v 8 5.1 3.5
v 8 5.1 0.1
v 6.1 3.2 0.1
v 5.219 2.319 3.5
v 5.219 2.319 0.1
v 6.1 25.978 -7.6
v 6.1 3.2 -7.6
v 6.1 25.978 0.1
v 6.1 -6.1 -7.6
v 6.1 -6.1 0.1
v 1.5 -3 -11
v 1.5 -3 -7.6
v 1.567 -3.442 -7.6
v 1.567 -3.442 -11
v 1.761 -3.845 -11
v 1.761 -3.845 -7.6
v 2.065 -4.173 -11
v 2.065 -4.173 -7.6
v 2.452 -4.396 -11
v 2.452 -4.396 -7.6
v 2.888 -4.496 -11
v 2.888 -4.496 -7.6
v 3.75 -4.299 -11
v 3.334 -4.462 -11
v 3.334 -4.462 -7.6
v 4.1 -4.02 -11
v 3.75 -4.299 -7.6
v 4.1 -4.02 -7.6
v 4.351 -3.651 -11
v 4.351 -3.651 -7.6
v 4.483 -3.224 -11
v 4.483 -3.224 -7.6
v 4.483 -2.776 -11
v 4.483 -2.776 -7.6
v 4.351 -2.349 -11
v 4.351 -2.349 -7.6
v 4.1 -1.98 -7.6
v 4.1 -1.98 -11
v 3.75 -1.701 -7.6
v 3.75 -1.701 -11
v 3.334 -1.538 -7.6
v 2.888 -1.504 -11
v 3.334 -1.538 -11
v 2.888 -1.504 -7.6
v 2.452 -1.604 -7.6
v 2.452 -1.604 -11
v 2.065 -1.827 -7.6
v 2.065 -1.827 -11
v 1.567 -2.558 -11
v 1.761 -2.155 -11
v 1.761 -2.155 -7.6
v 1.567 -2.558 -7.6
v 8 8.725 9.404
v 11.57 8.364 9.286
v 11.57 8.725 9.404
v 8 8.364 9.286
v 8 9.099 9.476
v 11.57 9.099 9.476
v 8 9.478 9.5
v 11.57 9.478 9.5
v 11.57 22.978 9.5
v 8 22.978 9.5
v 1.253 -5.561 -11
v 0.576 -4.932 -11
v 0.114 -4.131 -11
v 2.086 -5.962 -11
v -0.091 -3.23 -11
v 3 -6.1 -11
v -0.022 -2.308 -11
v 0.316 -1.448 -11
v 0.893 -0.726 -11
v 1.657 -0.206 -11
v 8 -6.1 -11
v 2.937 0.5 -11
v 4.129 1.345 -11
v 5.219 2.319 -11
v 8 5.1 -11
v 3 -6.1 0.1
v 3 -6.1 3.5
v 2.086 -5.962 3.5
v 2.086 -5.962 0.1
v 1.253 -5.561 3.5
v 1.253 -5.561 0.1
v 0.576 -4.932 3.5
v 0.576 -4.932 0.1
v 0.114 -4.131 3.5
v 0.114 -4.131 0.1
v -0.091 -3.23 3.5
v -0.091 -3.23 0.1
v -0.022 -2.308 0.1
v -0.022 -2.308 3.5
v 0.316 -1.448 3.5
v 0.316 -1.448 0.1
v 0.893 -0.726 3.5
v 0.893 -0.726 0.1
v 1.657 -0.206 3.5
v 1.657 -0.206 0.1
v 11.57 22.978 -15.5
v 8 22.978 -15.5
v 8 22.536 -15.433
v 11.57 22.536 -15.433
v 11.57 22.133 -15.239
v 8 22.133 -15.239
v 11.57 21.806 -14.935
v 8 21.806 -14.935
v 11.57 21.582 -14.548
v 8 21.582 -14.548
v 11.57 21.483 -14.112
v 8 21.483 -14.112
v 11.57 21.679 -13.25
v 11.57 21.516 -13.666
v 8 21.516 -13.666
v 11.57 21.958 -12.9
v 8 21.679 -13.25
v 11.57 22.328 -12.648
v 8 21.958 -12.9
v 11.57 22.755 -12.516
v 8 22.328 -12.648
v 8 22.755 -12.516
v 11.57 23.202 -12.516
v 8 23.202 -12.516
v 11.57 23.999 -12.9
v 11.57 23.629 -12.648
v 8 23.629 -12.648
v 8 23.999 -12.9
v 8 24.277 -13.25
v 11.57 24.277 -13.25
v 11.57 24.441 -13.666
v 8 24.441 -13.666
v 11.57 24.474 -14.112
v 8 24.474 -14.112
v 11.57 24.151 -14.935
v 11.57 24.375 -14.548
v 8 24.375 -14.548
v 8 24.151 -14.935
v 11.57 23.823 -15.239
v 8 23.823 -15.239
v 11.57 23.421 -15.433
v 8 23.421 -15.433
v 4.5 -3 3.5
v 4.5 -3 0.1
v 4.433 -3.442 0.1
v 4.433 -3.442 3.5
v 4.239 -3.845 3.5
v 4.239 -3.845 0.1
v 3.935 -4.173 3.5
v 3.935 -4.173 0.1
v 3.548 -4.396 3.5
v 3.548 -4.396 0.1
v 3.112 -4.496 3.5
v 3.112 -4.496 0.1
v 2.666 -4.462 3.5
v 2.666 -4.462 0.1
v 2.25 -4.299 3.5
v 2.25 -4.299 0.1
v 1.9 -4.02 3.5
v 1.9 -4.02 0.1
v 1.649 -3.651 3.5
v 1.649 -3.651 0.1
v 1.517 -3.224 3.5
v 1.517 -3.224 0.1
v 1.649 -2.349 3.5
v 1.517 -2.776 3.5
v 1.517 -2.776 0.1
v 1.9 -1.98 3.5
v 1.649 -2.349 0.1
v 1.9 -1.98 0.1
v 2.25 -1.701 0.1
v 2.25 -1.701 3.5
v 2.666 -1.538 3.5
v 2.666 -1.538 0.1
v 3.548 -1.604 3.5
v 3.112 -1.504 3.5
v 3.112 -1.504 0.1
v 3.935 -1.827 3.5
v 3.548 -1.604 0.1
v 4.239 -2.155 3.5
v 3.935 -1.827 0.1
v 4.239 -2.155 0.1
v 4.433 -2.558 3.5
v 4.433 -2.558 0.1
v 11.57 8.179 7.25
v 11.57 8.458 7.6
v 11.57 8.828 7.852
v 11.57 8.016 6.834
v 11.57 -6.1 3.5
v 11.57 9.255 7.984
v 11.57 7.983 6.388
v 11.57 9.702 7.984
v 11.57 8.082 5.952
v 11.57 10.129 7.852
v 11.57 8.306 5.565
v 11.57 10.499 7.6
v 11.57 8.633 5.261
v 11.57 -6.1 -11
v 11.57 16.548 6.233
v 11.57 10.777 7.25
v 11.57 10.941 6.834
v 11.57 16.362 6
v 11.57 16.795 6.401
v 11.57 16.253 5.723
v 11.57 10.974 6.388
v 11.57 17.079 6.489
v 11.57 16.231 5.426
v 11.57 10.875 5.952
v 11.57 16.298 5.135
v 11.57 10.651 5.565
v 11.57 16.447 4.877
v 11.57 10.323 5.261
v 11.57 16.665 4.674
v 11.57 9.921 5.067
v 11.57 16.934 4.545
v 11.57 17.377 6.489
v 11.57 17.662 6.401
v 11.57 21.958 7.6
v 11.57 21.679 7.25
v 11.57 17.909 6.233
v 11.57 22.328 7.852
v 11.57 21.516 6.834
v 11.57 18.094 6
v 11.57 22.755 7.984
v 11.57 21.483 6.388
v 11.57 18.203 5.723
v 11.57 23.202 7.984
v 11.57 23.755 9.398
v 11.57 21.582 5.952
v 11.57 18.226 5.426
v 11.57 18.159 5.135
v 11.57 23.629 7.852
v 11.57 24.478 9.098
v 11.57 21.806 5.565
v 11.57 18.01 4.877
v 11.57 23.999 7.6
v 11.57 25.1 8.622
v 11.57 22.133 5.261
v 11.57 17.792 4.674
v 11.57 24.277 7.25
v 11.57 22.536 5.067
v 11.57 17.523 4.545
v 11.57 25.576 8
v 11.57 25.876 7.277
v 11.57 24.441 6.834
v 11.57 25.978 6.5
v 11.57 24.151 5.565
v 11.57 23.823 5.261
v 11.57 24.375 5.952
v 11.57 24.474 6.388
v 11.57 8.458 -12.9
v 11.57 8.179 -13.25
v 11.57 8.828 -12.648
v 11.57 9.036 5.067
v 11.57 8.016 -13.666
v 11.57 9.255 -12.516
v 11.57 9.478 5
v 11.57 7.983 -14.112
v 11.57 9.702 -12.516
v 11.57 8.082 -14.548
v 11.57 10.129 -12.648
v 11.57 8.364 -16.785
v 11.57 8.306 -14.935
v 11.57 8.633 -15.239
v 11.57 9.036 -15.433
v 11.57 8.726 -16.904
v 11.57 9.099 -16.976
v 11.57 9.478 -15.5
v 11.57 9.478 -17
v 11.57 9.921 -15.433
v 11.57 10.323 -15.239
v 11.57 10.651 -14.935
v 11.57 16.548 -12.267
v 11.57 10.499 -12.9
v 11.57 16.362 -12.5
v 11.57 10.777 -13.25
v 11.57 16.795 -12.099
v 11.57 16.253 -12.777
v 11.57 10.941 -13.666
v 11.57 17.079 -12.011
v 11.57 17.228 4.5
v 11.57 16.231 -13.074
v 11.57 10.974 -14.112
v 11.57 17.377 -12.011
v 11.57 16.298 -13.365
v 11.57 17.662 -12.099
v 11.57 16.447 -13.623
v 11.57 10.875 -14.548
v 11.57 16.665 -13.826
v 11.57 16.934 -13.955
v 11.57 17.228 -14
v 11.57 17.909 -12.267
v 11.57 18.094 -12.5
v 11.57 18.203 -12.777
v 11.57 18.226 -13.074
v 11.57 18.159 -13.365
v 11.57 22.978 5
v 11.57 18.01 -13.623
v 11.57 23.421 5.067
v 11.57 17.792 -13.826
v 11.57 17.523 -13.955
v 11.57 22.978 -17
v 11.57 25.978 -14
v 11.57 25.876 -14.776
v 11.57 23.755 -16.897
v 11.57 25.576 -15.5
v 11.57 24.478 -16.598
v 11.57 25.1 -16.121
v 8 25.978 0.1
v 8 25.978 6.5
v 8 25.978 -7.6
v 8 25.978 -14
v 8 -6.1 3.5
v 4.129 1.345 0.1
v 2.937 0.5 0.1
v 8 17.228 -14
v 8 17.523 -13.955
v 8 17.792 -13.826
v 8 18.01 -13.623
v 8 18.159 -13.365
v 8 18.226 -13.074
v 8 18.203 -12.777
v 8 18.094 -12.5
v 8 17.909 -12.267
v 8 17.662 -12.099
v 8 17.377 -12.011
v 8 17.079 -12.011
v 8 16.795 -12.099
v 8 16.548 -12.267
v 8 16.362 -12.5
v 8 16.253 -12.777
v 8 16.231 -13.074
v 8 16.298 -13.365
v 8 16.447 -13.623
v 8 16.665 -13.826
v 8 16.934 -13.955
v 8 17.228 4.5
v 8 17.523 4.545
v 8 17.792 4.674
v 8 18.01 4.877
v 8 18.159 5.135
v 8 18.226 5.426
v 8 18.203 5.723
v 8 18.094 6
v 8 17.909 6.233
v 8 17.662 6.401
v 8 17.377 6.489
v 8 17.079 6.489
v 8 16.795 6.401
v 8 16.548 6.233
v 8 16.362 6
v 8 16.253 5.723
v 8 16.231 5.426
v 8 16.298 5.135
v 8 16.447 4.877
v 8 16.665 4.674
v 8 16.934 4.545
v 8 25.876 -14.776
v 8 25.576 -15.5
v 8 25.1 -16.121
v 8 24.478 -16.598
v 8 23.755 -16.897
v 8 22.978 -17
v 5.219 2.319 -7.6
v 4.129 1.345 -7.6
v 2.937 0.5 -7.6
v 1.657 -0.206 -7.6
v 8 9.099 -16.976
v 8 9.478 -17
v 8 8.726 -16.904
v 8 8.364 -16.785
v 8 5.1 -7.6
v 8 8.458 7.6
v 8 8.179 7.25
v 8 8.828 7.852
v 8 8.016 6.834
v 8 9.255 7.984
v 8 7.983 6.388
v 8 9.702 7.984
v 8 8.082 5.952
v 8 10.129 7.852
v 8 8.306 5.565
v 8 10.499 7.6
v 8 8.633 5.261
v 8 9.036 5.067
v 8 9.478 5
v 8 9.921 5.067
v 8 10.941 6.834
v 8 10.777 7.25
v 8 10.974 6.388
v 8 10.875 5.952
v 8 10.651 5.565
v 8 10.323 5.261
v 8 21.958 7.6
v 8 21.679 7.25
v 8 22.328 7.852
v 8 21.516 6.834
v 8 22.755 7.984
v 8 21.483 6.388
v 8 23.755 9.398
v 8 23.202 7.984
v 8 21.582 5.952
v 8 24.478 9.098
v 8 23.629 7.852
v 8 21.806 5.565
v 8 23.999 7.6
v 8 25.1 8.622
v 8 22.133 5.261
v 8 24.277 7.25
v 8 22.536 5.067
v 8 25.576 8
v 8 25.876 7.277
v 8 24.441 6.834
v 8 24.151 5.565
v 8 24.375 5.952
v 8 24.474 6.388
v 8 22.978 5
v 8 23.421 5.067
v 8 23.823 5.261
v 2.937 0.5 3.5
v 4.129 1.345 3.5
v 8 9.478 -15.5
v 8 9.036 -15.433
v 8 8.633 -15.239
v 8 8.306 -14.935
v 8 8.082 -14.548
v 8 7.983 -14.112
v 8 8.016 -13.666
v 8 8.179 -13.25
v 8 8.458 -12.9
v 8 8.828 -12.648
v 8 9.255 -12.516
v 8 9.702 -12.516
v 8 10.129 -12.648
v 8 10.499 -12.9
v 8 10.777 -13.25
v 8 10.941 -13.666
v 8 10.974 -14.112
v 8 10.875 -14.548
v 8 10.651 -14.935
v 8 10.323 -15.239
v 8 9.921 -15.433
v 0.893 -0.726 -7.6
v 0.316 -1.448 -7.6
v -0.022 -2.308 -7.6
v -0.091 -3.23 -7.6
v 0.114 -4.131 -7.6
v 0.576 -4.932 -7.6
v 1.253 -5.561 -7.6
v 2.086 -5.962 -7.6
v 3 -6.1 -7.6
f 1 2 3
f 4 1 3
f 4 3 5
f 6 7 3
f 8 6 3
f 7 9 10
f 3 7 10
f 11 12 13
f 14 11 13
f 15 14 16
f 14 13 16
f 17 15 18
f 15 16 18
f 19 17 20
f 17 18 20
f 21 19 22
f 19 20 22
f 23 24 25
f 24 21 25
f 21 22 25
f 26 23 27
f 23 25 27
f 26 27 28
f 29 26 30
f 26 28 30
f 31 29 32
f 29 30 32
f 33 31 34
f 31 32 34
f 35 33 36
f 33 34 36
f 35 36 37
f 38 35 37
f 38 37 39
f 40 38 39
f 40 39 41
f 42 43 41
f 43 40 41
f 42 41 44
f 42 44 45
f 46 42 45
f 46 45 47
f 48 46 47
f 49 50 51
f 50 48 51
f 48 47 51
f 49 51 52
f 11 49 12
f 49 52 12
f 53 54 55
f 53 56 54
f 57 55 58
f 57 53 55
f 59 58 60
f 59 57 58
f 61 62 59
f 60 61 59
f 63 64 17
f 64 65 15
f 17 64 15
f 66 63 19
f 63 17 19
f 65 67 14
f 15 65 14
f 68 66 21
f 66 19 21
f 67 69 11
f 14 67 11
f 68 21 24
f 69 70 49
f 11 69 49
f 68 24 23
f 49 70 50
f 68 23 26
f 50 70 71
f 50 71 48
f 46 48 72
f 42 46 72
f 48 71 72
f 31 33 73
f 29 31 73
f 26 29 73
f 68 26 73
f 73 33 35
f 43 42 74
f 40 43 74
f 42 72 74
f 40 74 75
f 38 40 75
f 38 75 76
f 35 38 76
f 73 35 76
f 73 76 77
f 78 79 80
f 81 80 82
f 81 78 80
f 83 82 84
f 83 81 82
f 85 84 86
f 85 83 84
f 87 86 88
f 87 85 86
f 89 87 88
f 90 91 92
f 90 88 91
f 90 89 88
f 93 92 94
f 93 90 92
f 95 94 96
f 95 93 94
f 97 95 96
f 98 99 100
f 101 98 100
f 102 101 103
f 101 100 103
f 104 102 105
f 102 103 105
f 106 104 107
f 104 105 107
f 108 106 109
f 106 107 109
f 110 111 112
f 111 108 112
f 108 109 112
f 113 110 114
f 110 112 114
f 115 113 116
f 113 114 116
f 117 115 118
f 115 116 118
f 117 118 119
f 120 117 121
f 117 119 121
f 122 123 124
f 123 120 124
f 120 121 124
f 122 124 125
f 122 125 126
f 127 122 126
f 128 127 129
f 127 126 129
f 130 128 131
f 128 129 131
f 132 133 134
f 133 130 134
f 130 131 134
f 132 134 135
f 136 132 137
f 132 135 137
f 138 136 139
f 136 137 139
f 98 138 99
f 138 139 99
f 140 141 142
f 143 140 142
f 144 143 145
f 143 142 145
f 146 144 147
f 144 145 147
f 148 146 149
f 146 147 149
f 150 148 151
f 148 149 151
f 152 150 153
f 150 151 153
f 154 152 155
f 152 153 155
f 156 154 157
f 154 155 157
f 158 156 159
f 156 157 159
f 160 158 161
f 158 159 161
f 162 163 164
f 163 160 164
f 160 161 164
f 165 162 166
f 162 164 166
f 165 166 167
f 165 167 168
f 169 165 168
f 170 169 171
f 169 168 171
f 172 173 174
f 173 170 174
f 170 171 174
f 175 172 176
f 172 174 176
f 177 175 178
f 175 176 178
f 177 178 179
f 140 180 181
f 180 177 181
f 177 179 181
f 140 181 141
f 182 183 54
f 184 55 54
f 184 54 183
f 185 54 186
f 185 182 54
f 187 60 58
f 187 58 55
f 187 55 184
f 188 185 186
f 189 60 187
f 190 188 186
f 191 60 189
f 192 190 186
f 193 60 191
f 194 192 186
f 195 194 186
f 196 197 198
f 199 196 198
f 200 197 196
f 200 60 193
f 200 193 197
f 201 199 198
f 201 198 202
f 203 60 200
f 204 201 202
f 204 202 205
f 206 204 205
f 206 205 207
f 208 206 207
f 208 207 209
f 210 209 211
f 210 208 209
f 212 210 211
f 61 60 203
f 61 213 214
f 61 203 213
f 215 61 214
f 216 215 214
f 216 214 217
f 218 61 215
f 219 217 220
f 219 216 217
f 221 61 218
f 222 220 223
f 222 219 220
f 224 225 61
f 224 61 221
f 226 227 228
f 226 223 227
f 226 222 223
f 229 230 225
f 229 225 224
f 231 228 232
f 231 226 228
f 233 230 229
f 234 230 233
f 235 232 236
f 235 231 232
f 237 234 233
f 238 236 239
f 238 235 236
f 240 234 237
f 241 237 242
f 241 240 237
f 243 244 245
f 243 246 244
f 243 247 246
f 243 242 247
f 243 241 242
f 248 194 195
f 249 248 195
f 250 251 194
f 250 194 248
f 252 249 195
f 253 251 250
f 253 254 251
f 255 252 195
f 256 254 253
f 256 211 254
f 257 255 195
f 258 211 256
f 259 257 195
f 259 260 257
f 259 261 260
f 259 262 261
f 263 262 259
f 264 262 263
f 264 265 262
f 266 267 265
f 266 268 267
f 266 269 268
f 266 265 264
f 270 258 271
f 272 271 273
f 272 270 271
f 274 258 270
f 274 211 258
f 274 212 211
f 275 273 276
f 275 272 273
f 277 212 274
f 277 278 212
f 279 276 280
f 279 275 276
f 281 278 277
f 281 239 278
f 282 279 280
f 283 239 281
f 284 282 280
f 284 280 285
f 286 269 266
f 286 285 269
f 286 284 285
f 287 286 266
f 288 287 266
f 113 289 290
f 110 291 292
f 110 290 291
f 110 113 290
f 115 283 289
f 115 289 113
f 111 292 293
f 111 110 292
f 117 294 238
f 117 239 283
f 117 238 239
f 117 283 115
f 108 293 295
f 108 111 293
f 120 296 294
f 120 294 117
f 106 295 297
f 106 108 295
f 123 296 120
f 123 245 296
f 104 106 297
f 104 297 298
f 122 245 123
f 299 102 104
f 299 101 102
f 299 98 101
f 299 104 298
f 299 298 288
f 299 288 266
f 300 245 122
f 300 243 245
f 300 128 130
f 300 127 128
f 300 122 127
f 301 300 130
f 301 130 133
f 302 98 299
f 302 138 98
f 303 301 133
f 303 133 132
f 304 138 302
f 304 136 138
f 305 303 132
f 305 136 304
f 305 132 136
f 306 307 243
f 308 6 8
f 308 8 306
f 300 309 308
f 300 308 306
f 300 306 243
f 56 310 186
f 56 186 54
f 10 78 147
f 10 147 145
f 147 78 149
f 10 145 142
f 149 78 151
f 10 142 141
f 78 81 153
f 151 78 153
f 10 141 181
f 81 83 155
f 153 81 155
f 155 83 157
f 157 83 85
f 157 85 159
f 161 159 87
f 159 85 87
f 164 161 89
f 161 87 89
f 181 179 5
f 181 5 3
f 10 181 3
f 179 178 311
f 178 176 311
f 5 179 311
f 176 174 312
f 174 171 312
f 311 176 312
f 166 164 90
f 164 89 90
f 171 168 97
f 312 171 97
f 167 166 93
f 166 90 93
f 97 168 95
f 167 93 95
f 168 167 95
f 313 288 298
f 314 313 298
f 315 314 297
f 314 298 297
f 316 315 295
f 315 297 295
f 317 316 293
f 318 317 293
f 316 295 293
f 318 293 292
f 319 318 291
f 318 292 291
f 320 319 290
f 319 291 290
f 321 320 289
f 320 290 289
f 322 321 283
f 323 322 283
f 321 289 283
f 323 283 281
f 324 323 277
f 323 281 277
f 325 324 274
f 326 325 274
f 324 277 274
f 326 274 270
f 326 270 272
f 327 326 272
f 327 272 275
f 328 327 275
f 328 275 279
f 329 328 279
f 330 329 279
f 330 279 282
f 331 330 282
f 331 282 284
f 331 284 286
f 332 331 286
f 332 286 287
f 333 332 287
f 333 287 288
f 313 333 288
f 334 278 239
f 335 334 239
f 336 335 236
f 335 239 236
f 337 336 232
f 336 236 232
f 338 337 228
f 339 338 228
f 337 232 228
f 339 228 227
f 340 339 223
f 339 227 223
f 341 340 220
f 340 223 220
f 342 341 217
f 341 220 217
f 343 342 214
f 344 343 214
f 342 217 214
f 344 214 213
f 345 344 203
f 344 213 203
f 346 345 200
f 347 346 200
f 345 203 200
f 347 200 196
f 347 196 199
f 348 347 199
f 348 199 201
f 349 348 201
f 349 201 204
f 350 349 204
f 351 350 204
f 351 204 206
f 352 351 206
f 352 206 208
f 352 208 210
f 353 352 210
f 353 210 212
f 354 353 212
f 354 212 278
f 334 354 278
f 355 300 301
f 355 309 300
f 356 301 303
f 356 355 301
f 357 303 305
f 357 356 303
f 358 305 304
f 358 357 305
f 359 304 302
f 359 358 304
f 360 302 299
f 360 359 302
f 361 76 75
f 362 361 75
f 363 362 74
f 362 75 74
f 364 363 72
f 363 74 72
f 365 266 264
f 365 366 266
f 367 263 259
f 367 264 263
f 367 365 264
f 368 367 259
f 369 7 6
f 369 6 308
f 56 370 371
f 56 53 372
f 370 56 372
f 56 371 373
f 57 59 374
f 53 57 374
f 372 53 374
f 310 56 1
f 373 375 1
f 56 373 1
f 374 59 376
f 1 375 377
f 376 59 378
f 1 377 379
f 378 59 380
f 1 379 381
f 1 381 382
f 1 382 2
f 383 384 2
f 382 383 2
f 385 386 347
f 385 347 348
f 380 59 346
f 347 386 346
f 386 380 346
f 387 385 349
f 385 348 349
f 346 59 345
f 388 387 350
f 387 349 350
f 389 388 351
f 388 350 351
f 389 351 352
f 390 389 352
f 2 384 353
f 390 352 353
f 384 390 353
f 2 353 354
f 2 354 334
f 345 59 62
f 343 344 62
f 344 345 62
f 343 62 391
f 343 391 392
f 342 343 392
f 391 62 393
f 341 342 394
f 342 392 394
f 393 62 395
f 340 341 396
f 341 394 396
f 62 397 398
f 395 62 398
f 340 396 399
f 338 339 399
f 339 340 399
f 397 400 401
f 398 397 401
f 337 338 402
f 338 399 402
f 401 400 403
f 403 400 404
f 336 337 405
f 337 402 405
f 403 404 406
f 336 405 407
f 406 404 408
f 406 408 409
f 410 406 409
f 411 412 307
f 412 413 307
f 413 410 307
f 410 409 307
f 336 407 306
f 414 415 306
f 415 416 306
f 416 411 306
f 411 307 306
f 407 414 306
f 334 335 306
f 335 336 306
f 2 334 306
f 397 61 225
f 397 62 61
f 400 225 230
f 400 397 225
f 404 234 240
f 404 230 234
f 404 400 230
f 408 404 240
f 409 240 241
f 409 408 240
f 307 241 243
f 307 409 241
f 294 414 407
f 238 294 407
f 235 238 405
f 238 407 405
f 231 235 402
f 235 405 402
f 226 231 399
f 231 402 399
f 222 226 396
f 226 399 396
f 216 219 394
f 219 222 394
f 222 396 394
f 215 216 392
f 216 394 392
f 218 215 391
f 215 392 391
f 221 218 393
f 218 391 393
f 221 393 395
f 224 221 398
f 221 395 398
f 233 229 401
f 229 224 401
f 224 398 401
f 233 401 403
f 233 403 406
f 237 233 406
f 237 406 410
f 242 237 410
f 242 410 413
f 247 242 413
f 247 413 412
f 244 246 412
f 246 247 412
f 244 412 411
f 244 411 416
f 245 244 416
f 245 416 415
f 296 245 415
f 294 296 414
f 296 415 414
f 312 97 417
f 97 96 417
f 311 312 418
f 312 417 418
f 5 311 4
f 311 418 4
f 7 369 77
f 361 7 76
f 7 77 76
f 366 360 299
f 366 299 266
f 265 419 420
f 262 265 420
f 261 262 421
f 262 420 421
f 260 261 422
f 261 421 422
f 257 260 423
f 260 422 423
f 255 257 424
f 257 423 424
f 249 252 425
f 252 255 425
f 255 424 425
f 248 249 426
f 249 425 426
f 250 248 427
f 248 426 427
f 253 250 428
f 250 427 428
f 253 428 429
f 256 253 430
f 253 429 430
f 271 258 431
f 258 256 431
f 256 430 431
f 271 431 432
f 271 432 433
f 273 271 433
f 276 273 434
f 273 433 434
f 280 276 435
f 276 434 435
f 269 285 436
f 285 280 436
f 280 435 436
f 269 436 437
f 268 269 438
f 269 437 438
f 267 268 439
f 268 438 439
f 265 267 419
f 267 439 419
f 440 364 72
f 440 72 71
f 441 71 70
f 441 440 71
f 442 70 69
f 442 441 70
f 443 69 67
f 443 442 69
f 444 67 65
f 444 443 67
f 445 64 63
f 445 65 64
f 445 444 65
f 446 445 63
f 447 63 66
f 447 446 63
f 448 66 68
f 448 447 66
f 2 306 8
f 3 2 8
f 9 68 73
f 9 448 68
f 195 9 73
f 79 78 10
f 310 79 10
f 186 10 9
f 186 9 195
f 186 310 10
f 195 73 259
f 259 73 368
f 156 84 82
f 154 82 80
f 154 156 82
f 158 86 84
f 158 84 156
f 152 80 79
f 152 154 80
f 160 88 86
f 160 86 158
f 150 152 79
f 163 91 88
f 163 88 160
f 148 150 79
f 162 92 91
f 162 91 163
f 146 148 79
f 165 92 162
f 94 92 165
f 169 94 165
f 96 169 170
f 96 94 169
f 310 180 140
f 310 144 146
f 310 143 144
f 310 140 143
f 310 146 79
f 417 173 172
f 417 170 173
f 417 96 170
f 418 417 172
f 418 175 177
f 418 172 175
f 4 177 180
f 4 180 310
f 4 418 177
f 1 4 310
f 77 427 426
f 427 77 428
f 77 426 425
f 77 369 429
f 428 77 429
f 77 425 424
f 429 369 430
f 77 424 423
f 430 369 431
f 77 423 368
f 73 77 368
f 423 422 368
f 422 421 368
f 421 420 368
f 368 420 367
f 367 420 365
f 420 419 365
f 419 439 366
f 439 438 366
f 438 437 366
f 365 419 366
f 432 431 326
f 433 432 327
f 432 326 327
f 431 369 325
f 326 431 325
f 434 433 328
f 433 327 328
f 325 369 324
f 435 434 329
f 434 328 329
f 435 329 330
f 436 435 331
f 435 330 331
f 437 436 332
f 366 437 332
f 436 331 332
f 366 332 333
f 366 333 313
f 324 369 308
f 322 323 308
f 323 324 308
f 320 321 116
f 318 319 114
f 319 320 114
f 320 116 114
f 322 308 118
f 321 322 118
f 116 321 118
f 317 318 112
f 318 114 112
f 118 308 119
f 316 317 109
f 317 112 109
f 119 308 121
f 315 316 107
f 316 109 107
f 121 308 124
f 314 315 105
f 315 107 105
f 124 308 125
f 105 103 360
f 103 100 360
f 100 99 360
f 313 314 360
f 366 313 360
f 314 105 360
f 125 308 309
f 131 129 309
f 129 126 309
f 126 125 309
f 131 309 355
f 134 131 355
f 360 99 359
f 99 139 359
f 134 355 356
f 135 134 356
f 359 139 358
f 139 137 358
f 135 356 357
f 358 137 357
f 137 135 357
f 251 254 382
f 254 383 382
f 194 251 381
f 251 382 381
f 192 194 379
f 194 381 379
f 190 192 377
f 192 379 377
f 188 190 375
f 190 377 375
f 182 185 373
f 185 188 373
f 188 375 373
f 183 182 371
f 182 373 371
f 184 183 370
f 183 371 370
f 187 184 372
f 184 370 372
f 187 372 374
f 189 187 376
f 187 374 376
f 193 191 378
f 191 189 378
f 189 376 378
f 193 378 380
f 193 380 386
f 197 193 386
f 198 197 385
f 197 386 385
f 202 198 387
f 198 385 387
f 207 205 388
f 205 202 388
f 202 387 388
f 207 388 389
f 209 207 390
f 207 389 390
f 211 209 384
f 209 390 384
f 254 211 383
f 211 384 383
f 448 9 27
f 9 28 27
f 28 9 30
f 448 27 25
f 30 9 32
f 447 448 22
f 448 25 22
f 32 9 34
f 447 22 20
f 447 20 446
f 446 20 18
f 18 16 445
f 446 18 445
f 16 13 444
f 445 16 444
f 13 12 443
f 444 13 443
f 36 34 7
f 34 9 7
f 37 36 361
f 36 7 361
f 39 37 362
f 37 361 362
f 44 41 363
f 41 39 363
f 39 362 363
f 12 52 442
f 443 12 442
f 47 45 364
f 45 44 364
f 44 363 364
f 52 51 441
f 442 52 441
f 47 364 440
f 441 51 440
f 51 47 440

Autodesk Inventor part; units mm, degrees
ref_plane "YZ Plane" through (0, 0, 0) normal (1, 0, 0) x (0, 1, 0)
sketch "Sketch1" plane through (0, 0, 0) normal (0, 0, 1) x (1, 0, 0)
  circle A0 centre (3, -3) radius 1.5 projected
  arc A1 (4.6242, -5.5223) -> (3, 0) centre (3, -3) ccw projected
  arc A2 (4.6783, -5.6064) -> (3, 0.1) centre (3, -3) ccw
  circle A3 centre (3, -3) radius 3.1
  point P0 (0, 0)
  point P1 (3, 0.1)
  dimension "d0" = 0.1
extrude "Extrusion1" add sketch "Sketch1" along normal blind 3.5
sketch "Sketch2" plane through (3, -3, 0) normal (0, 0, -1) x (-1, 0, 0)
  circle A0 centre (0, 0) radius 3.1 projected
  point P0 (3, 3)
extrude "Extrusion2" cut sketch "Sketch2" against normal blind 0.1
sketch "Sketch3" plane through (3, -3, 3.5) normal (0, 0, 1) x (1, 0, 0)
  circle A0 centre (0, 0) radius 3.1 projected
  line L0 (0, 3.1) -> (5, 3.1)
  line L1 (0, -3.1) -> (5, -3.1)
  line L2 (5, -3.1) -> (5, 3.1)
  point P0 (-3, 3)
  dimension "d5" = 5
  dimension "d6" = 5
ref_plane "Work Plane1" through (-0.6712, -8.5, -7.5) normal (0, 0, -1) x (0, 1, 0)
extrude "Extrusion3" add sketch "Sketch3" against normal up to surface (11 mm away) contours A0 L0 L2 L1
sketch "Sketch4" plane through (8, 0.1, -7.5) normal (0, 0, -1) x (-1, 0, 0)
  arc A0 (5, 0) -> (5, -6.2) centre (5, -3.1) ccw projected
  line L0 (0, 0) -> (5, 0) projected
  line L1 (0, -6.2) -> (0, 0) projected
  line L2 (5, -6.2) -> (0, -6.2) projected
  point P0 (8, -0.1)
extrude "Extrusion4" add sketch "Sketch4" along normal blind 0.1
sketch "Sketch5" plane through (8, 0.1, -7.6) normal (0, 0, -1) x (-1, 0, 0)
  arc A0 (5, -6.2) -> (5, 0) centre (5, -3.1) ccw projected
  line L0 (5, -6.2) -> (0, -6.2) projected
  line L1 (0, -6.2) -> (0, 0) projected
  line L2 (0, 0) -> (5, 0) projected
  circle A1 centre (5, -3.1) radius 1.5 projected
  point P0 (8, -0.1)
extrude "Extrusion5" add sketch "Sketch5" along normal blind 3.4
sketch "Sketch6" plane through (3, 0.1, 3.5) normal (0, 1, 0) x (1, 0, 0)
  line L0 (0, 3.5) -> (3, 3.5) projected
  line L1 (0, 11.1) -> (3.1, 11.1) projected
  line L2 (0, 3.4) -> (0, 11.1) projected
  line L3 (0, 3.4) -> (3.1, 3.4) projected
  line L4 (3.1, 3.4) -> (0, 3.4)
  line L5 (0, 3.4) -> (0, 11.1)
  line L6 (0, 11.1) -> (3.1, 11.1)
  line L7 (3.1, 11.1) -> (3.1, 3.4)
  point P0 (-3, 3.5)
extrude "Extrusion6" cut sketch "Sketch6" against normal through all
sketch "Sketch7" plane through (8, -6.1, 3.5) normal (1, 0, 0) x (0, 0, -1)
  line L0 (0, 0) -> (14.5, 0) projected
  line L1 (7.25, 0) -> (7.25, 35.3128)
  line L2 (7.25, 0) -> (42.5628, 0) construction
  point P0 (3.5, 6.1)
  dimension "d15" = 90
sketch "Sketch8" plane through (8, -6.1, 3.5) normal (1, 0, 0) x (0, 0, -1)
  circle A0 centre (-3.0004, 15.5784) radius 1.1 projected
  circle A1 centre (-3.0004, 29.0784) radius 1.1 projected
  circle A2 centre (17.4996, 29.0784) radius 1.1 projected
  circle A3 centre (17.4996, 15.5784) radius 1.1 projected
  circle A4 centre (-3.0004, 15.5784) radius 1.5
  circle A5 centre (-3.0004, 29.0784) radius 1.5
  circle A6 centre (17.4996, 29.0784) radius 1.5
  circle A7 centre (17.4996, 15.5784) radius 1.5
  circle A8 centre (17.4996, 15.5784) radius 3
  circle A9 centre (17.4996, 29.0784) radius 3
  circle A10 centre (-3.0004, 29.0784) radius 3
  circle A11 centre (-3.0004, 15.5784) radius 3
  line L0 (-3.0004, 32.0784) -> (17.4996, 32.0784)
  line L1 (-6.0004, 29.0784) -> (-6.0004, 15.5784)
  line L2 (20.4996, 29.0784) -> (20.4996, 15.5784)
  line L3 (-3.0004, 12.5784) -> (17.4996, 12.5784)
  line L4 (0, 6.2) -> (14.5, 6.2) projected
  line L5 (0, 0) -> (0, 6.2) projected
  line L6 (0, 0) -> (14.5, 0) projected
  line L7 (14.5, 6.2) -> (14.5, 0) projected
  line L8 (0, 0) -> (-5.7858, 14.4642)
  line L9 (14.5, 0) -> (20.2851, 14.4643)
  point P0 (3.5, 6.1)
  dimension "d16" = 3
  dimension "d17" = 3
  dimension "d18" = 3
  dimension "d19" = 3
  dimension "d20" = 6
  dimension "d21" = 6
  dimension "d22" = 6
  dimension "d23" = 6
ref_plane "Work Plane2" through (11.5705, 1.2284, -16.2496) normal (-1, 0, 0) x (0, 0, 1)
extrude "Extrusion7" add sketch "Sketch8" along normal up to surface (3.5705 mm away) contours A8 | A8 L3 A11 L1 A10 L0 A9 L2 | A8 L9 L7 L4 L5 L8 A11 L3 | A9 | A11 | L6 L5 L4 L7 | A10
sketch "Sketch9" plane through (3, 0.1, 3.5) normal (0, 1, 0) x (1, 0, 0)
  line L0 (3.1, 11.1) -> (3.1, 3.4) projected
  line L1 (5, 17.4996) -> (5, -3.0004) projected
  line L2 (3.1, 11.1) -> (0, 11.1) projected
  line L3 (3.1, 11.1) -> (5, 11.1)
  line L4 (5, 11.1) -> (5, 3.4)
  line L5 (5, 3.4) -> (3.1, 3.4)
  line L6 (3.1, 3.4) -> (3.1, 11.1)
  point P0 (-3, 3.5)
  point P1 (3.1, 3.4)
  point P2 (5, 11.1)
extrude "Extrusion8" add sketch "Sketch9" along normal up to surface (25.8784 mm away)
sketch "Sketch10" plane through (11.5705, 9.4784, -16.9996) normal (1, 0, 0) x (0, 0, -1)
  circle A0 centre (-22.5, 7.75) radius 0.5 projected
  circle A1 centre (-4, 7.75) radius 0.5 projected
  circle A2 centre (-22.5, 7.75) radius 1
  circle A3 centre (-4, 7.75) radius 1
  point P0 (-16.9996, -9.4784)
  dimension "d29" = 2
  dimension "d30" = 2
extrude "Extrusion9" cut sketch "Sketch10" against normal through all contours A0 | A1 | A2 | A3
chamfer "Chamfer1" distance 5 angle 45 2 edges at (8, 0.1, 1.8) (8, 0.1, -9.3)
fillet "Fillet1" radius 13 2 edges at (3, 0.1, -9.3) (3, 0.1, 1.8)
properties part number "TheCamera_3DPrint"
